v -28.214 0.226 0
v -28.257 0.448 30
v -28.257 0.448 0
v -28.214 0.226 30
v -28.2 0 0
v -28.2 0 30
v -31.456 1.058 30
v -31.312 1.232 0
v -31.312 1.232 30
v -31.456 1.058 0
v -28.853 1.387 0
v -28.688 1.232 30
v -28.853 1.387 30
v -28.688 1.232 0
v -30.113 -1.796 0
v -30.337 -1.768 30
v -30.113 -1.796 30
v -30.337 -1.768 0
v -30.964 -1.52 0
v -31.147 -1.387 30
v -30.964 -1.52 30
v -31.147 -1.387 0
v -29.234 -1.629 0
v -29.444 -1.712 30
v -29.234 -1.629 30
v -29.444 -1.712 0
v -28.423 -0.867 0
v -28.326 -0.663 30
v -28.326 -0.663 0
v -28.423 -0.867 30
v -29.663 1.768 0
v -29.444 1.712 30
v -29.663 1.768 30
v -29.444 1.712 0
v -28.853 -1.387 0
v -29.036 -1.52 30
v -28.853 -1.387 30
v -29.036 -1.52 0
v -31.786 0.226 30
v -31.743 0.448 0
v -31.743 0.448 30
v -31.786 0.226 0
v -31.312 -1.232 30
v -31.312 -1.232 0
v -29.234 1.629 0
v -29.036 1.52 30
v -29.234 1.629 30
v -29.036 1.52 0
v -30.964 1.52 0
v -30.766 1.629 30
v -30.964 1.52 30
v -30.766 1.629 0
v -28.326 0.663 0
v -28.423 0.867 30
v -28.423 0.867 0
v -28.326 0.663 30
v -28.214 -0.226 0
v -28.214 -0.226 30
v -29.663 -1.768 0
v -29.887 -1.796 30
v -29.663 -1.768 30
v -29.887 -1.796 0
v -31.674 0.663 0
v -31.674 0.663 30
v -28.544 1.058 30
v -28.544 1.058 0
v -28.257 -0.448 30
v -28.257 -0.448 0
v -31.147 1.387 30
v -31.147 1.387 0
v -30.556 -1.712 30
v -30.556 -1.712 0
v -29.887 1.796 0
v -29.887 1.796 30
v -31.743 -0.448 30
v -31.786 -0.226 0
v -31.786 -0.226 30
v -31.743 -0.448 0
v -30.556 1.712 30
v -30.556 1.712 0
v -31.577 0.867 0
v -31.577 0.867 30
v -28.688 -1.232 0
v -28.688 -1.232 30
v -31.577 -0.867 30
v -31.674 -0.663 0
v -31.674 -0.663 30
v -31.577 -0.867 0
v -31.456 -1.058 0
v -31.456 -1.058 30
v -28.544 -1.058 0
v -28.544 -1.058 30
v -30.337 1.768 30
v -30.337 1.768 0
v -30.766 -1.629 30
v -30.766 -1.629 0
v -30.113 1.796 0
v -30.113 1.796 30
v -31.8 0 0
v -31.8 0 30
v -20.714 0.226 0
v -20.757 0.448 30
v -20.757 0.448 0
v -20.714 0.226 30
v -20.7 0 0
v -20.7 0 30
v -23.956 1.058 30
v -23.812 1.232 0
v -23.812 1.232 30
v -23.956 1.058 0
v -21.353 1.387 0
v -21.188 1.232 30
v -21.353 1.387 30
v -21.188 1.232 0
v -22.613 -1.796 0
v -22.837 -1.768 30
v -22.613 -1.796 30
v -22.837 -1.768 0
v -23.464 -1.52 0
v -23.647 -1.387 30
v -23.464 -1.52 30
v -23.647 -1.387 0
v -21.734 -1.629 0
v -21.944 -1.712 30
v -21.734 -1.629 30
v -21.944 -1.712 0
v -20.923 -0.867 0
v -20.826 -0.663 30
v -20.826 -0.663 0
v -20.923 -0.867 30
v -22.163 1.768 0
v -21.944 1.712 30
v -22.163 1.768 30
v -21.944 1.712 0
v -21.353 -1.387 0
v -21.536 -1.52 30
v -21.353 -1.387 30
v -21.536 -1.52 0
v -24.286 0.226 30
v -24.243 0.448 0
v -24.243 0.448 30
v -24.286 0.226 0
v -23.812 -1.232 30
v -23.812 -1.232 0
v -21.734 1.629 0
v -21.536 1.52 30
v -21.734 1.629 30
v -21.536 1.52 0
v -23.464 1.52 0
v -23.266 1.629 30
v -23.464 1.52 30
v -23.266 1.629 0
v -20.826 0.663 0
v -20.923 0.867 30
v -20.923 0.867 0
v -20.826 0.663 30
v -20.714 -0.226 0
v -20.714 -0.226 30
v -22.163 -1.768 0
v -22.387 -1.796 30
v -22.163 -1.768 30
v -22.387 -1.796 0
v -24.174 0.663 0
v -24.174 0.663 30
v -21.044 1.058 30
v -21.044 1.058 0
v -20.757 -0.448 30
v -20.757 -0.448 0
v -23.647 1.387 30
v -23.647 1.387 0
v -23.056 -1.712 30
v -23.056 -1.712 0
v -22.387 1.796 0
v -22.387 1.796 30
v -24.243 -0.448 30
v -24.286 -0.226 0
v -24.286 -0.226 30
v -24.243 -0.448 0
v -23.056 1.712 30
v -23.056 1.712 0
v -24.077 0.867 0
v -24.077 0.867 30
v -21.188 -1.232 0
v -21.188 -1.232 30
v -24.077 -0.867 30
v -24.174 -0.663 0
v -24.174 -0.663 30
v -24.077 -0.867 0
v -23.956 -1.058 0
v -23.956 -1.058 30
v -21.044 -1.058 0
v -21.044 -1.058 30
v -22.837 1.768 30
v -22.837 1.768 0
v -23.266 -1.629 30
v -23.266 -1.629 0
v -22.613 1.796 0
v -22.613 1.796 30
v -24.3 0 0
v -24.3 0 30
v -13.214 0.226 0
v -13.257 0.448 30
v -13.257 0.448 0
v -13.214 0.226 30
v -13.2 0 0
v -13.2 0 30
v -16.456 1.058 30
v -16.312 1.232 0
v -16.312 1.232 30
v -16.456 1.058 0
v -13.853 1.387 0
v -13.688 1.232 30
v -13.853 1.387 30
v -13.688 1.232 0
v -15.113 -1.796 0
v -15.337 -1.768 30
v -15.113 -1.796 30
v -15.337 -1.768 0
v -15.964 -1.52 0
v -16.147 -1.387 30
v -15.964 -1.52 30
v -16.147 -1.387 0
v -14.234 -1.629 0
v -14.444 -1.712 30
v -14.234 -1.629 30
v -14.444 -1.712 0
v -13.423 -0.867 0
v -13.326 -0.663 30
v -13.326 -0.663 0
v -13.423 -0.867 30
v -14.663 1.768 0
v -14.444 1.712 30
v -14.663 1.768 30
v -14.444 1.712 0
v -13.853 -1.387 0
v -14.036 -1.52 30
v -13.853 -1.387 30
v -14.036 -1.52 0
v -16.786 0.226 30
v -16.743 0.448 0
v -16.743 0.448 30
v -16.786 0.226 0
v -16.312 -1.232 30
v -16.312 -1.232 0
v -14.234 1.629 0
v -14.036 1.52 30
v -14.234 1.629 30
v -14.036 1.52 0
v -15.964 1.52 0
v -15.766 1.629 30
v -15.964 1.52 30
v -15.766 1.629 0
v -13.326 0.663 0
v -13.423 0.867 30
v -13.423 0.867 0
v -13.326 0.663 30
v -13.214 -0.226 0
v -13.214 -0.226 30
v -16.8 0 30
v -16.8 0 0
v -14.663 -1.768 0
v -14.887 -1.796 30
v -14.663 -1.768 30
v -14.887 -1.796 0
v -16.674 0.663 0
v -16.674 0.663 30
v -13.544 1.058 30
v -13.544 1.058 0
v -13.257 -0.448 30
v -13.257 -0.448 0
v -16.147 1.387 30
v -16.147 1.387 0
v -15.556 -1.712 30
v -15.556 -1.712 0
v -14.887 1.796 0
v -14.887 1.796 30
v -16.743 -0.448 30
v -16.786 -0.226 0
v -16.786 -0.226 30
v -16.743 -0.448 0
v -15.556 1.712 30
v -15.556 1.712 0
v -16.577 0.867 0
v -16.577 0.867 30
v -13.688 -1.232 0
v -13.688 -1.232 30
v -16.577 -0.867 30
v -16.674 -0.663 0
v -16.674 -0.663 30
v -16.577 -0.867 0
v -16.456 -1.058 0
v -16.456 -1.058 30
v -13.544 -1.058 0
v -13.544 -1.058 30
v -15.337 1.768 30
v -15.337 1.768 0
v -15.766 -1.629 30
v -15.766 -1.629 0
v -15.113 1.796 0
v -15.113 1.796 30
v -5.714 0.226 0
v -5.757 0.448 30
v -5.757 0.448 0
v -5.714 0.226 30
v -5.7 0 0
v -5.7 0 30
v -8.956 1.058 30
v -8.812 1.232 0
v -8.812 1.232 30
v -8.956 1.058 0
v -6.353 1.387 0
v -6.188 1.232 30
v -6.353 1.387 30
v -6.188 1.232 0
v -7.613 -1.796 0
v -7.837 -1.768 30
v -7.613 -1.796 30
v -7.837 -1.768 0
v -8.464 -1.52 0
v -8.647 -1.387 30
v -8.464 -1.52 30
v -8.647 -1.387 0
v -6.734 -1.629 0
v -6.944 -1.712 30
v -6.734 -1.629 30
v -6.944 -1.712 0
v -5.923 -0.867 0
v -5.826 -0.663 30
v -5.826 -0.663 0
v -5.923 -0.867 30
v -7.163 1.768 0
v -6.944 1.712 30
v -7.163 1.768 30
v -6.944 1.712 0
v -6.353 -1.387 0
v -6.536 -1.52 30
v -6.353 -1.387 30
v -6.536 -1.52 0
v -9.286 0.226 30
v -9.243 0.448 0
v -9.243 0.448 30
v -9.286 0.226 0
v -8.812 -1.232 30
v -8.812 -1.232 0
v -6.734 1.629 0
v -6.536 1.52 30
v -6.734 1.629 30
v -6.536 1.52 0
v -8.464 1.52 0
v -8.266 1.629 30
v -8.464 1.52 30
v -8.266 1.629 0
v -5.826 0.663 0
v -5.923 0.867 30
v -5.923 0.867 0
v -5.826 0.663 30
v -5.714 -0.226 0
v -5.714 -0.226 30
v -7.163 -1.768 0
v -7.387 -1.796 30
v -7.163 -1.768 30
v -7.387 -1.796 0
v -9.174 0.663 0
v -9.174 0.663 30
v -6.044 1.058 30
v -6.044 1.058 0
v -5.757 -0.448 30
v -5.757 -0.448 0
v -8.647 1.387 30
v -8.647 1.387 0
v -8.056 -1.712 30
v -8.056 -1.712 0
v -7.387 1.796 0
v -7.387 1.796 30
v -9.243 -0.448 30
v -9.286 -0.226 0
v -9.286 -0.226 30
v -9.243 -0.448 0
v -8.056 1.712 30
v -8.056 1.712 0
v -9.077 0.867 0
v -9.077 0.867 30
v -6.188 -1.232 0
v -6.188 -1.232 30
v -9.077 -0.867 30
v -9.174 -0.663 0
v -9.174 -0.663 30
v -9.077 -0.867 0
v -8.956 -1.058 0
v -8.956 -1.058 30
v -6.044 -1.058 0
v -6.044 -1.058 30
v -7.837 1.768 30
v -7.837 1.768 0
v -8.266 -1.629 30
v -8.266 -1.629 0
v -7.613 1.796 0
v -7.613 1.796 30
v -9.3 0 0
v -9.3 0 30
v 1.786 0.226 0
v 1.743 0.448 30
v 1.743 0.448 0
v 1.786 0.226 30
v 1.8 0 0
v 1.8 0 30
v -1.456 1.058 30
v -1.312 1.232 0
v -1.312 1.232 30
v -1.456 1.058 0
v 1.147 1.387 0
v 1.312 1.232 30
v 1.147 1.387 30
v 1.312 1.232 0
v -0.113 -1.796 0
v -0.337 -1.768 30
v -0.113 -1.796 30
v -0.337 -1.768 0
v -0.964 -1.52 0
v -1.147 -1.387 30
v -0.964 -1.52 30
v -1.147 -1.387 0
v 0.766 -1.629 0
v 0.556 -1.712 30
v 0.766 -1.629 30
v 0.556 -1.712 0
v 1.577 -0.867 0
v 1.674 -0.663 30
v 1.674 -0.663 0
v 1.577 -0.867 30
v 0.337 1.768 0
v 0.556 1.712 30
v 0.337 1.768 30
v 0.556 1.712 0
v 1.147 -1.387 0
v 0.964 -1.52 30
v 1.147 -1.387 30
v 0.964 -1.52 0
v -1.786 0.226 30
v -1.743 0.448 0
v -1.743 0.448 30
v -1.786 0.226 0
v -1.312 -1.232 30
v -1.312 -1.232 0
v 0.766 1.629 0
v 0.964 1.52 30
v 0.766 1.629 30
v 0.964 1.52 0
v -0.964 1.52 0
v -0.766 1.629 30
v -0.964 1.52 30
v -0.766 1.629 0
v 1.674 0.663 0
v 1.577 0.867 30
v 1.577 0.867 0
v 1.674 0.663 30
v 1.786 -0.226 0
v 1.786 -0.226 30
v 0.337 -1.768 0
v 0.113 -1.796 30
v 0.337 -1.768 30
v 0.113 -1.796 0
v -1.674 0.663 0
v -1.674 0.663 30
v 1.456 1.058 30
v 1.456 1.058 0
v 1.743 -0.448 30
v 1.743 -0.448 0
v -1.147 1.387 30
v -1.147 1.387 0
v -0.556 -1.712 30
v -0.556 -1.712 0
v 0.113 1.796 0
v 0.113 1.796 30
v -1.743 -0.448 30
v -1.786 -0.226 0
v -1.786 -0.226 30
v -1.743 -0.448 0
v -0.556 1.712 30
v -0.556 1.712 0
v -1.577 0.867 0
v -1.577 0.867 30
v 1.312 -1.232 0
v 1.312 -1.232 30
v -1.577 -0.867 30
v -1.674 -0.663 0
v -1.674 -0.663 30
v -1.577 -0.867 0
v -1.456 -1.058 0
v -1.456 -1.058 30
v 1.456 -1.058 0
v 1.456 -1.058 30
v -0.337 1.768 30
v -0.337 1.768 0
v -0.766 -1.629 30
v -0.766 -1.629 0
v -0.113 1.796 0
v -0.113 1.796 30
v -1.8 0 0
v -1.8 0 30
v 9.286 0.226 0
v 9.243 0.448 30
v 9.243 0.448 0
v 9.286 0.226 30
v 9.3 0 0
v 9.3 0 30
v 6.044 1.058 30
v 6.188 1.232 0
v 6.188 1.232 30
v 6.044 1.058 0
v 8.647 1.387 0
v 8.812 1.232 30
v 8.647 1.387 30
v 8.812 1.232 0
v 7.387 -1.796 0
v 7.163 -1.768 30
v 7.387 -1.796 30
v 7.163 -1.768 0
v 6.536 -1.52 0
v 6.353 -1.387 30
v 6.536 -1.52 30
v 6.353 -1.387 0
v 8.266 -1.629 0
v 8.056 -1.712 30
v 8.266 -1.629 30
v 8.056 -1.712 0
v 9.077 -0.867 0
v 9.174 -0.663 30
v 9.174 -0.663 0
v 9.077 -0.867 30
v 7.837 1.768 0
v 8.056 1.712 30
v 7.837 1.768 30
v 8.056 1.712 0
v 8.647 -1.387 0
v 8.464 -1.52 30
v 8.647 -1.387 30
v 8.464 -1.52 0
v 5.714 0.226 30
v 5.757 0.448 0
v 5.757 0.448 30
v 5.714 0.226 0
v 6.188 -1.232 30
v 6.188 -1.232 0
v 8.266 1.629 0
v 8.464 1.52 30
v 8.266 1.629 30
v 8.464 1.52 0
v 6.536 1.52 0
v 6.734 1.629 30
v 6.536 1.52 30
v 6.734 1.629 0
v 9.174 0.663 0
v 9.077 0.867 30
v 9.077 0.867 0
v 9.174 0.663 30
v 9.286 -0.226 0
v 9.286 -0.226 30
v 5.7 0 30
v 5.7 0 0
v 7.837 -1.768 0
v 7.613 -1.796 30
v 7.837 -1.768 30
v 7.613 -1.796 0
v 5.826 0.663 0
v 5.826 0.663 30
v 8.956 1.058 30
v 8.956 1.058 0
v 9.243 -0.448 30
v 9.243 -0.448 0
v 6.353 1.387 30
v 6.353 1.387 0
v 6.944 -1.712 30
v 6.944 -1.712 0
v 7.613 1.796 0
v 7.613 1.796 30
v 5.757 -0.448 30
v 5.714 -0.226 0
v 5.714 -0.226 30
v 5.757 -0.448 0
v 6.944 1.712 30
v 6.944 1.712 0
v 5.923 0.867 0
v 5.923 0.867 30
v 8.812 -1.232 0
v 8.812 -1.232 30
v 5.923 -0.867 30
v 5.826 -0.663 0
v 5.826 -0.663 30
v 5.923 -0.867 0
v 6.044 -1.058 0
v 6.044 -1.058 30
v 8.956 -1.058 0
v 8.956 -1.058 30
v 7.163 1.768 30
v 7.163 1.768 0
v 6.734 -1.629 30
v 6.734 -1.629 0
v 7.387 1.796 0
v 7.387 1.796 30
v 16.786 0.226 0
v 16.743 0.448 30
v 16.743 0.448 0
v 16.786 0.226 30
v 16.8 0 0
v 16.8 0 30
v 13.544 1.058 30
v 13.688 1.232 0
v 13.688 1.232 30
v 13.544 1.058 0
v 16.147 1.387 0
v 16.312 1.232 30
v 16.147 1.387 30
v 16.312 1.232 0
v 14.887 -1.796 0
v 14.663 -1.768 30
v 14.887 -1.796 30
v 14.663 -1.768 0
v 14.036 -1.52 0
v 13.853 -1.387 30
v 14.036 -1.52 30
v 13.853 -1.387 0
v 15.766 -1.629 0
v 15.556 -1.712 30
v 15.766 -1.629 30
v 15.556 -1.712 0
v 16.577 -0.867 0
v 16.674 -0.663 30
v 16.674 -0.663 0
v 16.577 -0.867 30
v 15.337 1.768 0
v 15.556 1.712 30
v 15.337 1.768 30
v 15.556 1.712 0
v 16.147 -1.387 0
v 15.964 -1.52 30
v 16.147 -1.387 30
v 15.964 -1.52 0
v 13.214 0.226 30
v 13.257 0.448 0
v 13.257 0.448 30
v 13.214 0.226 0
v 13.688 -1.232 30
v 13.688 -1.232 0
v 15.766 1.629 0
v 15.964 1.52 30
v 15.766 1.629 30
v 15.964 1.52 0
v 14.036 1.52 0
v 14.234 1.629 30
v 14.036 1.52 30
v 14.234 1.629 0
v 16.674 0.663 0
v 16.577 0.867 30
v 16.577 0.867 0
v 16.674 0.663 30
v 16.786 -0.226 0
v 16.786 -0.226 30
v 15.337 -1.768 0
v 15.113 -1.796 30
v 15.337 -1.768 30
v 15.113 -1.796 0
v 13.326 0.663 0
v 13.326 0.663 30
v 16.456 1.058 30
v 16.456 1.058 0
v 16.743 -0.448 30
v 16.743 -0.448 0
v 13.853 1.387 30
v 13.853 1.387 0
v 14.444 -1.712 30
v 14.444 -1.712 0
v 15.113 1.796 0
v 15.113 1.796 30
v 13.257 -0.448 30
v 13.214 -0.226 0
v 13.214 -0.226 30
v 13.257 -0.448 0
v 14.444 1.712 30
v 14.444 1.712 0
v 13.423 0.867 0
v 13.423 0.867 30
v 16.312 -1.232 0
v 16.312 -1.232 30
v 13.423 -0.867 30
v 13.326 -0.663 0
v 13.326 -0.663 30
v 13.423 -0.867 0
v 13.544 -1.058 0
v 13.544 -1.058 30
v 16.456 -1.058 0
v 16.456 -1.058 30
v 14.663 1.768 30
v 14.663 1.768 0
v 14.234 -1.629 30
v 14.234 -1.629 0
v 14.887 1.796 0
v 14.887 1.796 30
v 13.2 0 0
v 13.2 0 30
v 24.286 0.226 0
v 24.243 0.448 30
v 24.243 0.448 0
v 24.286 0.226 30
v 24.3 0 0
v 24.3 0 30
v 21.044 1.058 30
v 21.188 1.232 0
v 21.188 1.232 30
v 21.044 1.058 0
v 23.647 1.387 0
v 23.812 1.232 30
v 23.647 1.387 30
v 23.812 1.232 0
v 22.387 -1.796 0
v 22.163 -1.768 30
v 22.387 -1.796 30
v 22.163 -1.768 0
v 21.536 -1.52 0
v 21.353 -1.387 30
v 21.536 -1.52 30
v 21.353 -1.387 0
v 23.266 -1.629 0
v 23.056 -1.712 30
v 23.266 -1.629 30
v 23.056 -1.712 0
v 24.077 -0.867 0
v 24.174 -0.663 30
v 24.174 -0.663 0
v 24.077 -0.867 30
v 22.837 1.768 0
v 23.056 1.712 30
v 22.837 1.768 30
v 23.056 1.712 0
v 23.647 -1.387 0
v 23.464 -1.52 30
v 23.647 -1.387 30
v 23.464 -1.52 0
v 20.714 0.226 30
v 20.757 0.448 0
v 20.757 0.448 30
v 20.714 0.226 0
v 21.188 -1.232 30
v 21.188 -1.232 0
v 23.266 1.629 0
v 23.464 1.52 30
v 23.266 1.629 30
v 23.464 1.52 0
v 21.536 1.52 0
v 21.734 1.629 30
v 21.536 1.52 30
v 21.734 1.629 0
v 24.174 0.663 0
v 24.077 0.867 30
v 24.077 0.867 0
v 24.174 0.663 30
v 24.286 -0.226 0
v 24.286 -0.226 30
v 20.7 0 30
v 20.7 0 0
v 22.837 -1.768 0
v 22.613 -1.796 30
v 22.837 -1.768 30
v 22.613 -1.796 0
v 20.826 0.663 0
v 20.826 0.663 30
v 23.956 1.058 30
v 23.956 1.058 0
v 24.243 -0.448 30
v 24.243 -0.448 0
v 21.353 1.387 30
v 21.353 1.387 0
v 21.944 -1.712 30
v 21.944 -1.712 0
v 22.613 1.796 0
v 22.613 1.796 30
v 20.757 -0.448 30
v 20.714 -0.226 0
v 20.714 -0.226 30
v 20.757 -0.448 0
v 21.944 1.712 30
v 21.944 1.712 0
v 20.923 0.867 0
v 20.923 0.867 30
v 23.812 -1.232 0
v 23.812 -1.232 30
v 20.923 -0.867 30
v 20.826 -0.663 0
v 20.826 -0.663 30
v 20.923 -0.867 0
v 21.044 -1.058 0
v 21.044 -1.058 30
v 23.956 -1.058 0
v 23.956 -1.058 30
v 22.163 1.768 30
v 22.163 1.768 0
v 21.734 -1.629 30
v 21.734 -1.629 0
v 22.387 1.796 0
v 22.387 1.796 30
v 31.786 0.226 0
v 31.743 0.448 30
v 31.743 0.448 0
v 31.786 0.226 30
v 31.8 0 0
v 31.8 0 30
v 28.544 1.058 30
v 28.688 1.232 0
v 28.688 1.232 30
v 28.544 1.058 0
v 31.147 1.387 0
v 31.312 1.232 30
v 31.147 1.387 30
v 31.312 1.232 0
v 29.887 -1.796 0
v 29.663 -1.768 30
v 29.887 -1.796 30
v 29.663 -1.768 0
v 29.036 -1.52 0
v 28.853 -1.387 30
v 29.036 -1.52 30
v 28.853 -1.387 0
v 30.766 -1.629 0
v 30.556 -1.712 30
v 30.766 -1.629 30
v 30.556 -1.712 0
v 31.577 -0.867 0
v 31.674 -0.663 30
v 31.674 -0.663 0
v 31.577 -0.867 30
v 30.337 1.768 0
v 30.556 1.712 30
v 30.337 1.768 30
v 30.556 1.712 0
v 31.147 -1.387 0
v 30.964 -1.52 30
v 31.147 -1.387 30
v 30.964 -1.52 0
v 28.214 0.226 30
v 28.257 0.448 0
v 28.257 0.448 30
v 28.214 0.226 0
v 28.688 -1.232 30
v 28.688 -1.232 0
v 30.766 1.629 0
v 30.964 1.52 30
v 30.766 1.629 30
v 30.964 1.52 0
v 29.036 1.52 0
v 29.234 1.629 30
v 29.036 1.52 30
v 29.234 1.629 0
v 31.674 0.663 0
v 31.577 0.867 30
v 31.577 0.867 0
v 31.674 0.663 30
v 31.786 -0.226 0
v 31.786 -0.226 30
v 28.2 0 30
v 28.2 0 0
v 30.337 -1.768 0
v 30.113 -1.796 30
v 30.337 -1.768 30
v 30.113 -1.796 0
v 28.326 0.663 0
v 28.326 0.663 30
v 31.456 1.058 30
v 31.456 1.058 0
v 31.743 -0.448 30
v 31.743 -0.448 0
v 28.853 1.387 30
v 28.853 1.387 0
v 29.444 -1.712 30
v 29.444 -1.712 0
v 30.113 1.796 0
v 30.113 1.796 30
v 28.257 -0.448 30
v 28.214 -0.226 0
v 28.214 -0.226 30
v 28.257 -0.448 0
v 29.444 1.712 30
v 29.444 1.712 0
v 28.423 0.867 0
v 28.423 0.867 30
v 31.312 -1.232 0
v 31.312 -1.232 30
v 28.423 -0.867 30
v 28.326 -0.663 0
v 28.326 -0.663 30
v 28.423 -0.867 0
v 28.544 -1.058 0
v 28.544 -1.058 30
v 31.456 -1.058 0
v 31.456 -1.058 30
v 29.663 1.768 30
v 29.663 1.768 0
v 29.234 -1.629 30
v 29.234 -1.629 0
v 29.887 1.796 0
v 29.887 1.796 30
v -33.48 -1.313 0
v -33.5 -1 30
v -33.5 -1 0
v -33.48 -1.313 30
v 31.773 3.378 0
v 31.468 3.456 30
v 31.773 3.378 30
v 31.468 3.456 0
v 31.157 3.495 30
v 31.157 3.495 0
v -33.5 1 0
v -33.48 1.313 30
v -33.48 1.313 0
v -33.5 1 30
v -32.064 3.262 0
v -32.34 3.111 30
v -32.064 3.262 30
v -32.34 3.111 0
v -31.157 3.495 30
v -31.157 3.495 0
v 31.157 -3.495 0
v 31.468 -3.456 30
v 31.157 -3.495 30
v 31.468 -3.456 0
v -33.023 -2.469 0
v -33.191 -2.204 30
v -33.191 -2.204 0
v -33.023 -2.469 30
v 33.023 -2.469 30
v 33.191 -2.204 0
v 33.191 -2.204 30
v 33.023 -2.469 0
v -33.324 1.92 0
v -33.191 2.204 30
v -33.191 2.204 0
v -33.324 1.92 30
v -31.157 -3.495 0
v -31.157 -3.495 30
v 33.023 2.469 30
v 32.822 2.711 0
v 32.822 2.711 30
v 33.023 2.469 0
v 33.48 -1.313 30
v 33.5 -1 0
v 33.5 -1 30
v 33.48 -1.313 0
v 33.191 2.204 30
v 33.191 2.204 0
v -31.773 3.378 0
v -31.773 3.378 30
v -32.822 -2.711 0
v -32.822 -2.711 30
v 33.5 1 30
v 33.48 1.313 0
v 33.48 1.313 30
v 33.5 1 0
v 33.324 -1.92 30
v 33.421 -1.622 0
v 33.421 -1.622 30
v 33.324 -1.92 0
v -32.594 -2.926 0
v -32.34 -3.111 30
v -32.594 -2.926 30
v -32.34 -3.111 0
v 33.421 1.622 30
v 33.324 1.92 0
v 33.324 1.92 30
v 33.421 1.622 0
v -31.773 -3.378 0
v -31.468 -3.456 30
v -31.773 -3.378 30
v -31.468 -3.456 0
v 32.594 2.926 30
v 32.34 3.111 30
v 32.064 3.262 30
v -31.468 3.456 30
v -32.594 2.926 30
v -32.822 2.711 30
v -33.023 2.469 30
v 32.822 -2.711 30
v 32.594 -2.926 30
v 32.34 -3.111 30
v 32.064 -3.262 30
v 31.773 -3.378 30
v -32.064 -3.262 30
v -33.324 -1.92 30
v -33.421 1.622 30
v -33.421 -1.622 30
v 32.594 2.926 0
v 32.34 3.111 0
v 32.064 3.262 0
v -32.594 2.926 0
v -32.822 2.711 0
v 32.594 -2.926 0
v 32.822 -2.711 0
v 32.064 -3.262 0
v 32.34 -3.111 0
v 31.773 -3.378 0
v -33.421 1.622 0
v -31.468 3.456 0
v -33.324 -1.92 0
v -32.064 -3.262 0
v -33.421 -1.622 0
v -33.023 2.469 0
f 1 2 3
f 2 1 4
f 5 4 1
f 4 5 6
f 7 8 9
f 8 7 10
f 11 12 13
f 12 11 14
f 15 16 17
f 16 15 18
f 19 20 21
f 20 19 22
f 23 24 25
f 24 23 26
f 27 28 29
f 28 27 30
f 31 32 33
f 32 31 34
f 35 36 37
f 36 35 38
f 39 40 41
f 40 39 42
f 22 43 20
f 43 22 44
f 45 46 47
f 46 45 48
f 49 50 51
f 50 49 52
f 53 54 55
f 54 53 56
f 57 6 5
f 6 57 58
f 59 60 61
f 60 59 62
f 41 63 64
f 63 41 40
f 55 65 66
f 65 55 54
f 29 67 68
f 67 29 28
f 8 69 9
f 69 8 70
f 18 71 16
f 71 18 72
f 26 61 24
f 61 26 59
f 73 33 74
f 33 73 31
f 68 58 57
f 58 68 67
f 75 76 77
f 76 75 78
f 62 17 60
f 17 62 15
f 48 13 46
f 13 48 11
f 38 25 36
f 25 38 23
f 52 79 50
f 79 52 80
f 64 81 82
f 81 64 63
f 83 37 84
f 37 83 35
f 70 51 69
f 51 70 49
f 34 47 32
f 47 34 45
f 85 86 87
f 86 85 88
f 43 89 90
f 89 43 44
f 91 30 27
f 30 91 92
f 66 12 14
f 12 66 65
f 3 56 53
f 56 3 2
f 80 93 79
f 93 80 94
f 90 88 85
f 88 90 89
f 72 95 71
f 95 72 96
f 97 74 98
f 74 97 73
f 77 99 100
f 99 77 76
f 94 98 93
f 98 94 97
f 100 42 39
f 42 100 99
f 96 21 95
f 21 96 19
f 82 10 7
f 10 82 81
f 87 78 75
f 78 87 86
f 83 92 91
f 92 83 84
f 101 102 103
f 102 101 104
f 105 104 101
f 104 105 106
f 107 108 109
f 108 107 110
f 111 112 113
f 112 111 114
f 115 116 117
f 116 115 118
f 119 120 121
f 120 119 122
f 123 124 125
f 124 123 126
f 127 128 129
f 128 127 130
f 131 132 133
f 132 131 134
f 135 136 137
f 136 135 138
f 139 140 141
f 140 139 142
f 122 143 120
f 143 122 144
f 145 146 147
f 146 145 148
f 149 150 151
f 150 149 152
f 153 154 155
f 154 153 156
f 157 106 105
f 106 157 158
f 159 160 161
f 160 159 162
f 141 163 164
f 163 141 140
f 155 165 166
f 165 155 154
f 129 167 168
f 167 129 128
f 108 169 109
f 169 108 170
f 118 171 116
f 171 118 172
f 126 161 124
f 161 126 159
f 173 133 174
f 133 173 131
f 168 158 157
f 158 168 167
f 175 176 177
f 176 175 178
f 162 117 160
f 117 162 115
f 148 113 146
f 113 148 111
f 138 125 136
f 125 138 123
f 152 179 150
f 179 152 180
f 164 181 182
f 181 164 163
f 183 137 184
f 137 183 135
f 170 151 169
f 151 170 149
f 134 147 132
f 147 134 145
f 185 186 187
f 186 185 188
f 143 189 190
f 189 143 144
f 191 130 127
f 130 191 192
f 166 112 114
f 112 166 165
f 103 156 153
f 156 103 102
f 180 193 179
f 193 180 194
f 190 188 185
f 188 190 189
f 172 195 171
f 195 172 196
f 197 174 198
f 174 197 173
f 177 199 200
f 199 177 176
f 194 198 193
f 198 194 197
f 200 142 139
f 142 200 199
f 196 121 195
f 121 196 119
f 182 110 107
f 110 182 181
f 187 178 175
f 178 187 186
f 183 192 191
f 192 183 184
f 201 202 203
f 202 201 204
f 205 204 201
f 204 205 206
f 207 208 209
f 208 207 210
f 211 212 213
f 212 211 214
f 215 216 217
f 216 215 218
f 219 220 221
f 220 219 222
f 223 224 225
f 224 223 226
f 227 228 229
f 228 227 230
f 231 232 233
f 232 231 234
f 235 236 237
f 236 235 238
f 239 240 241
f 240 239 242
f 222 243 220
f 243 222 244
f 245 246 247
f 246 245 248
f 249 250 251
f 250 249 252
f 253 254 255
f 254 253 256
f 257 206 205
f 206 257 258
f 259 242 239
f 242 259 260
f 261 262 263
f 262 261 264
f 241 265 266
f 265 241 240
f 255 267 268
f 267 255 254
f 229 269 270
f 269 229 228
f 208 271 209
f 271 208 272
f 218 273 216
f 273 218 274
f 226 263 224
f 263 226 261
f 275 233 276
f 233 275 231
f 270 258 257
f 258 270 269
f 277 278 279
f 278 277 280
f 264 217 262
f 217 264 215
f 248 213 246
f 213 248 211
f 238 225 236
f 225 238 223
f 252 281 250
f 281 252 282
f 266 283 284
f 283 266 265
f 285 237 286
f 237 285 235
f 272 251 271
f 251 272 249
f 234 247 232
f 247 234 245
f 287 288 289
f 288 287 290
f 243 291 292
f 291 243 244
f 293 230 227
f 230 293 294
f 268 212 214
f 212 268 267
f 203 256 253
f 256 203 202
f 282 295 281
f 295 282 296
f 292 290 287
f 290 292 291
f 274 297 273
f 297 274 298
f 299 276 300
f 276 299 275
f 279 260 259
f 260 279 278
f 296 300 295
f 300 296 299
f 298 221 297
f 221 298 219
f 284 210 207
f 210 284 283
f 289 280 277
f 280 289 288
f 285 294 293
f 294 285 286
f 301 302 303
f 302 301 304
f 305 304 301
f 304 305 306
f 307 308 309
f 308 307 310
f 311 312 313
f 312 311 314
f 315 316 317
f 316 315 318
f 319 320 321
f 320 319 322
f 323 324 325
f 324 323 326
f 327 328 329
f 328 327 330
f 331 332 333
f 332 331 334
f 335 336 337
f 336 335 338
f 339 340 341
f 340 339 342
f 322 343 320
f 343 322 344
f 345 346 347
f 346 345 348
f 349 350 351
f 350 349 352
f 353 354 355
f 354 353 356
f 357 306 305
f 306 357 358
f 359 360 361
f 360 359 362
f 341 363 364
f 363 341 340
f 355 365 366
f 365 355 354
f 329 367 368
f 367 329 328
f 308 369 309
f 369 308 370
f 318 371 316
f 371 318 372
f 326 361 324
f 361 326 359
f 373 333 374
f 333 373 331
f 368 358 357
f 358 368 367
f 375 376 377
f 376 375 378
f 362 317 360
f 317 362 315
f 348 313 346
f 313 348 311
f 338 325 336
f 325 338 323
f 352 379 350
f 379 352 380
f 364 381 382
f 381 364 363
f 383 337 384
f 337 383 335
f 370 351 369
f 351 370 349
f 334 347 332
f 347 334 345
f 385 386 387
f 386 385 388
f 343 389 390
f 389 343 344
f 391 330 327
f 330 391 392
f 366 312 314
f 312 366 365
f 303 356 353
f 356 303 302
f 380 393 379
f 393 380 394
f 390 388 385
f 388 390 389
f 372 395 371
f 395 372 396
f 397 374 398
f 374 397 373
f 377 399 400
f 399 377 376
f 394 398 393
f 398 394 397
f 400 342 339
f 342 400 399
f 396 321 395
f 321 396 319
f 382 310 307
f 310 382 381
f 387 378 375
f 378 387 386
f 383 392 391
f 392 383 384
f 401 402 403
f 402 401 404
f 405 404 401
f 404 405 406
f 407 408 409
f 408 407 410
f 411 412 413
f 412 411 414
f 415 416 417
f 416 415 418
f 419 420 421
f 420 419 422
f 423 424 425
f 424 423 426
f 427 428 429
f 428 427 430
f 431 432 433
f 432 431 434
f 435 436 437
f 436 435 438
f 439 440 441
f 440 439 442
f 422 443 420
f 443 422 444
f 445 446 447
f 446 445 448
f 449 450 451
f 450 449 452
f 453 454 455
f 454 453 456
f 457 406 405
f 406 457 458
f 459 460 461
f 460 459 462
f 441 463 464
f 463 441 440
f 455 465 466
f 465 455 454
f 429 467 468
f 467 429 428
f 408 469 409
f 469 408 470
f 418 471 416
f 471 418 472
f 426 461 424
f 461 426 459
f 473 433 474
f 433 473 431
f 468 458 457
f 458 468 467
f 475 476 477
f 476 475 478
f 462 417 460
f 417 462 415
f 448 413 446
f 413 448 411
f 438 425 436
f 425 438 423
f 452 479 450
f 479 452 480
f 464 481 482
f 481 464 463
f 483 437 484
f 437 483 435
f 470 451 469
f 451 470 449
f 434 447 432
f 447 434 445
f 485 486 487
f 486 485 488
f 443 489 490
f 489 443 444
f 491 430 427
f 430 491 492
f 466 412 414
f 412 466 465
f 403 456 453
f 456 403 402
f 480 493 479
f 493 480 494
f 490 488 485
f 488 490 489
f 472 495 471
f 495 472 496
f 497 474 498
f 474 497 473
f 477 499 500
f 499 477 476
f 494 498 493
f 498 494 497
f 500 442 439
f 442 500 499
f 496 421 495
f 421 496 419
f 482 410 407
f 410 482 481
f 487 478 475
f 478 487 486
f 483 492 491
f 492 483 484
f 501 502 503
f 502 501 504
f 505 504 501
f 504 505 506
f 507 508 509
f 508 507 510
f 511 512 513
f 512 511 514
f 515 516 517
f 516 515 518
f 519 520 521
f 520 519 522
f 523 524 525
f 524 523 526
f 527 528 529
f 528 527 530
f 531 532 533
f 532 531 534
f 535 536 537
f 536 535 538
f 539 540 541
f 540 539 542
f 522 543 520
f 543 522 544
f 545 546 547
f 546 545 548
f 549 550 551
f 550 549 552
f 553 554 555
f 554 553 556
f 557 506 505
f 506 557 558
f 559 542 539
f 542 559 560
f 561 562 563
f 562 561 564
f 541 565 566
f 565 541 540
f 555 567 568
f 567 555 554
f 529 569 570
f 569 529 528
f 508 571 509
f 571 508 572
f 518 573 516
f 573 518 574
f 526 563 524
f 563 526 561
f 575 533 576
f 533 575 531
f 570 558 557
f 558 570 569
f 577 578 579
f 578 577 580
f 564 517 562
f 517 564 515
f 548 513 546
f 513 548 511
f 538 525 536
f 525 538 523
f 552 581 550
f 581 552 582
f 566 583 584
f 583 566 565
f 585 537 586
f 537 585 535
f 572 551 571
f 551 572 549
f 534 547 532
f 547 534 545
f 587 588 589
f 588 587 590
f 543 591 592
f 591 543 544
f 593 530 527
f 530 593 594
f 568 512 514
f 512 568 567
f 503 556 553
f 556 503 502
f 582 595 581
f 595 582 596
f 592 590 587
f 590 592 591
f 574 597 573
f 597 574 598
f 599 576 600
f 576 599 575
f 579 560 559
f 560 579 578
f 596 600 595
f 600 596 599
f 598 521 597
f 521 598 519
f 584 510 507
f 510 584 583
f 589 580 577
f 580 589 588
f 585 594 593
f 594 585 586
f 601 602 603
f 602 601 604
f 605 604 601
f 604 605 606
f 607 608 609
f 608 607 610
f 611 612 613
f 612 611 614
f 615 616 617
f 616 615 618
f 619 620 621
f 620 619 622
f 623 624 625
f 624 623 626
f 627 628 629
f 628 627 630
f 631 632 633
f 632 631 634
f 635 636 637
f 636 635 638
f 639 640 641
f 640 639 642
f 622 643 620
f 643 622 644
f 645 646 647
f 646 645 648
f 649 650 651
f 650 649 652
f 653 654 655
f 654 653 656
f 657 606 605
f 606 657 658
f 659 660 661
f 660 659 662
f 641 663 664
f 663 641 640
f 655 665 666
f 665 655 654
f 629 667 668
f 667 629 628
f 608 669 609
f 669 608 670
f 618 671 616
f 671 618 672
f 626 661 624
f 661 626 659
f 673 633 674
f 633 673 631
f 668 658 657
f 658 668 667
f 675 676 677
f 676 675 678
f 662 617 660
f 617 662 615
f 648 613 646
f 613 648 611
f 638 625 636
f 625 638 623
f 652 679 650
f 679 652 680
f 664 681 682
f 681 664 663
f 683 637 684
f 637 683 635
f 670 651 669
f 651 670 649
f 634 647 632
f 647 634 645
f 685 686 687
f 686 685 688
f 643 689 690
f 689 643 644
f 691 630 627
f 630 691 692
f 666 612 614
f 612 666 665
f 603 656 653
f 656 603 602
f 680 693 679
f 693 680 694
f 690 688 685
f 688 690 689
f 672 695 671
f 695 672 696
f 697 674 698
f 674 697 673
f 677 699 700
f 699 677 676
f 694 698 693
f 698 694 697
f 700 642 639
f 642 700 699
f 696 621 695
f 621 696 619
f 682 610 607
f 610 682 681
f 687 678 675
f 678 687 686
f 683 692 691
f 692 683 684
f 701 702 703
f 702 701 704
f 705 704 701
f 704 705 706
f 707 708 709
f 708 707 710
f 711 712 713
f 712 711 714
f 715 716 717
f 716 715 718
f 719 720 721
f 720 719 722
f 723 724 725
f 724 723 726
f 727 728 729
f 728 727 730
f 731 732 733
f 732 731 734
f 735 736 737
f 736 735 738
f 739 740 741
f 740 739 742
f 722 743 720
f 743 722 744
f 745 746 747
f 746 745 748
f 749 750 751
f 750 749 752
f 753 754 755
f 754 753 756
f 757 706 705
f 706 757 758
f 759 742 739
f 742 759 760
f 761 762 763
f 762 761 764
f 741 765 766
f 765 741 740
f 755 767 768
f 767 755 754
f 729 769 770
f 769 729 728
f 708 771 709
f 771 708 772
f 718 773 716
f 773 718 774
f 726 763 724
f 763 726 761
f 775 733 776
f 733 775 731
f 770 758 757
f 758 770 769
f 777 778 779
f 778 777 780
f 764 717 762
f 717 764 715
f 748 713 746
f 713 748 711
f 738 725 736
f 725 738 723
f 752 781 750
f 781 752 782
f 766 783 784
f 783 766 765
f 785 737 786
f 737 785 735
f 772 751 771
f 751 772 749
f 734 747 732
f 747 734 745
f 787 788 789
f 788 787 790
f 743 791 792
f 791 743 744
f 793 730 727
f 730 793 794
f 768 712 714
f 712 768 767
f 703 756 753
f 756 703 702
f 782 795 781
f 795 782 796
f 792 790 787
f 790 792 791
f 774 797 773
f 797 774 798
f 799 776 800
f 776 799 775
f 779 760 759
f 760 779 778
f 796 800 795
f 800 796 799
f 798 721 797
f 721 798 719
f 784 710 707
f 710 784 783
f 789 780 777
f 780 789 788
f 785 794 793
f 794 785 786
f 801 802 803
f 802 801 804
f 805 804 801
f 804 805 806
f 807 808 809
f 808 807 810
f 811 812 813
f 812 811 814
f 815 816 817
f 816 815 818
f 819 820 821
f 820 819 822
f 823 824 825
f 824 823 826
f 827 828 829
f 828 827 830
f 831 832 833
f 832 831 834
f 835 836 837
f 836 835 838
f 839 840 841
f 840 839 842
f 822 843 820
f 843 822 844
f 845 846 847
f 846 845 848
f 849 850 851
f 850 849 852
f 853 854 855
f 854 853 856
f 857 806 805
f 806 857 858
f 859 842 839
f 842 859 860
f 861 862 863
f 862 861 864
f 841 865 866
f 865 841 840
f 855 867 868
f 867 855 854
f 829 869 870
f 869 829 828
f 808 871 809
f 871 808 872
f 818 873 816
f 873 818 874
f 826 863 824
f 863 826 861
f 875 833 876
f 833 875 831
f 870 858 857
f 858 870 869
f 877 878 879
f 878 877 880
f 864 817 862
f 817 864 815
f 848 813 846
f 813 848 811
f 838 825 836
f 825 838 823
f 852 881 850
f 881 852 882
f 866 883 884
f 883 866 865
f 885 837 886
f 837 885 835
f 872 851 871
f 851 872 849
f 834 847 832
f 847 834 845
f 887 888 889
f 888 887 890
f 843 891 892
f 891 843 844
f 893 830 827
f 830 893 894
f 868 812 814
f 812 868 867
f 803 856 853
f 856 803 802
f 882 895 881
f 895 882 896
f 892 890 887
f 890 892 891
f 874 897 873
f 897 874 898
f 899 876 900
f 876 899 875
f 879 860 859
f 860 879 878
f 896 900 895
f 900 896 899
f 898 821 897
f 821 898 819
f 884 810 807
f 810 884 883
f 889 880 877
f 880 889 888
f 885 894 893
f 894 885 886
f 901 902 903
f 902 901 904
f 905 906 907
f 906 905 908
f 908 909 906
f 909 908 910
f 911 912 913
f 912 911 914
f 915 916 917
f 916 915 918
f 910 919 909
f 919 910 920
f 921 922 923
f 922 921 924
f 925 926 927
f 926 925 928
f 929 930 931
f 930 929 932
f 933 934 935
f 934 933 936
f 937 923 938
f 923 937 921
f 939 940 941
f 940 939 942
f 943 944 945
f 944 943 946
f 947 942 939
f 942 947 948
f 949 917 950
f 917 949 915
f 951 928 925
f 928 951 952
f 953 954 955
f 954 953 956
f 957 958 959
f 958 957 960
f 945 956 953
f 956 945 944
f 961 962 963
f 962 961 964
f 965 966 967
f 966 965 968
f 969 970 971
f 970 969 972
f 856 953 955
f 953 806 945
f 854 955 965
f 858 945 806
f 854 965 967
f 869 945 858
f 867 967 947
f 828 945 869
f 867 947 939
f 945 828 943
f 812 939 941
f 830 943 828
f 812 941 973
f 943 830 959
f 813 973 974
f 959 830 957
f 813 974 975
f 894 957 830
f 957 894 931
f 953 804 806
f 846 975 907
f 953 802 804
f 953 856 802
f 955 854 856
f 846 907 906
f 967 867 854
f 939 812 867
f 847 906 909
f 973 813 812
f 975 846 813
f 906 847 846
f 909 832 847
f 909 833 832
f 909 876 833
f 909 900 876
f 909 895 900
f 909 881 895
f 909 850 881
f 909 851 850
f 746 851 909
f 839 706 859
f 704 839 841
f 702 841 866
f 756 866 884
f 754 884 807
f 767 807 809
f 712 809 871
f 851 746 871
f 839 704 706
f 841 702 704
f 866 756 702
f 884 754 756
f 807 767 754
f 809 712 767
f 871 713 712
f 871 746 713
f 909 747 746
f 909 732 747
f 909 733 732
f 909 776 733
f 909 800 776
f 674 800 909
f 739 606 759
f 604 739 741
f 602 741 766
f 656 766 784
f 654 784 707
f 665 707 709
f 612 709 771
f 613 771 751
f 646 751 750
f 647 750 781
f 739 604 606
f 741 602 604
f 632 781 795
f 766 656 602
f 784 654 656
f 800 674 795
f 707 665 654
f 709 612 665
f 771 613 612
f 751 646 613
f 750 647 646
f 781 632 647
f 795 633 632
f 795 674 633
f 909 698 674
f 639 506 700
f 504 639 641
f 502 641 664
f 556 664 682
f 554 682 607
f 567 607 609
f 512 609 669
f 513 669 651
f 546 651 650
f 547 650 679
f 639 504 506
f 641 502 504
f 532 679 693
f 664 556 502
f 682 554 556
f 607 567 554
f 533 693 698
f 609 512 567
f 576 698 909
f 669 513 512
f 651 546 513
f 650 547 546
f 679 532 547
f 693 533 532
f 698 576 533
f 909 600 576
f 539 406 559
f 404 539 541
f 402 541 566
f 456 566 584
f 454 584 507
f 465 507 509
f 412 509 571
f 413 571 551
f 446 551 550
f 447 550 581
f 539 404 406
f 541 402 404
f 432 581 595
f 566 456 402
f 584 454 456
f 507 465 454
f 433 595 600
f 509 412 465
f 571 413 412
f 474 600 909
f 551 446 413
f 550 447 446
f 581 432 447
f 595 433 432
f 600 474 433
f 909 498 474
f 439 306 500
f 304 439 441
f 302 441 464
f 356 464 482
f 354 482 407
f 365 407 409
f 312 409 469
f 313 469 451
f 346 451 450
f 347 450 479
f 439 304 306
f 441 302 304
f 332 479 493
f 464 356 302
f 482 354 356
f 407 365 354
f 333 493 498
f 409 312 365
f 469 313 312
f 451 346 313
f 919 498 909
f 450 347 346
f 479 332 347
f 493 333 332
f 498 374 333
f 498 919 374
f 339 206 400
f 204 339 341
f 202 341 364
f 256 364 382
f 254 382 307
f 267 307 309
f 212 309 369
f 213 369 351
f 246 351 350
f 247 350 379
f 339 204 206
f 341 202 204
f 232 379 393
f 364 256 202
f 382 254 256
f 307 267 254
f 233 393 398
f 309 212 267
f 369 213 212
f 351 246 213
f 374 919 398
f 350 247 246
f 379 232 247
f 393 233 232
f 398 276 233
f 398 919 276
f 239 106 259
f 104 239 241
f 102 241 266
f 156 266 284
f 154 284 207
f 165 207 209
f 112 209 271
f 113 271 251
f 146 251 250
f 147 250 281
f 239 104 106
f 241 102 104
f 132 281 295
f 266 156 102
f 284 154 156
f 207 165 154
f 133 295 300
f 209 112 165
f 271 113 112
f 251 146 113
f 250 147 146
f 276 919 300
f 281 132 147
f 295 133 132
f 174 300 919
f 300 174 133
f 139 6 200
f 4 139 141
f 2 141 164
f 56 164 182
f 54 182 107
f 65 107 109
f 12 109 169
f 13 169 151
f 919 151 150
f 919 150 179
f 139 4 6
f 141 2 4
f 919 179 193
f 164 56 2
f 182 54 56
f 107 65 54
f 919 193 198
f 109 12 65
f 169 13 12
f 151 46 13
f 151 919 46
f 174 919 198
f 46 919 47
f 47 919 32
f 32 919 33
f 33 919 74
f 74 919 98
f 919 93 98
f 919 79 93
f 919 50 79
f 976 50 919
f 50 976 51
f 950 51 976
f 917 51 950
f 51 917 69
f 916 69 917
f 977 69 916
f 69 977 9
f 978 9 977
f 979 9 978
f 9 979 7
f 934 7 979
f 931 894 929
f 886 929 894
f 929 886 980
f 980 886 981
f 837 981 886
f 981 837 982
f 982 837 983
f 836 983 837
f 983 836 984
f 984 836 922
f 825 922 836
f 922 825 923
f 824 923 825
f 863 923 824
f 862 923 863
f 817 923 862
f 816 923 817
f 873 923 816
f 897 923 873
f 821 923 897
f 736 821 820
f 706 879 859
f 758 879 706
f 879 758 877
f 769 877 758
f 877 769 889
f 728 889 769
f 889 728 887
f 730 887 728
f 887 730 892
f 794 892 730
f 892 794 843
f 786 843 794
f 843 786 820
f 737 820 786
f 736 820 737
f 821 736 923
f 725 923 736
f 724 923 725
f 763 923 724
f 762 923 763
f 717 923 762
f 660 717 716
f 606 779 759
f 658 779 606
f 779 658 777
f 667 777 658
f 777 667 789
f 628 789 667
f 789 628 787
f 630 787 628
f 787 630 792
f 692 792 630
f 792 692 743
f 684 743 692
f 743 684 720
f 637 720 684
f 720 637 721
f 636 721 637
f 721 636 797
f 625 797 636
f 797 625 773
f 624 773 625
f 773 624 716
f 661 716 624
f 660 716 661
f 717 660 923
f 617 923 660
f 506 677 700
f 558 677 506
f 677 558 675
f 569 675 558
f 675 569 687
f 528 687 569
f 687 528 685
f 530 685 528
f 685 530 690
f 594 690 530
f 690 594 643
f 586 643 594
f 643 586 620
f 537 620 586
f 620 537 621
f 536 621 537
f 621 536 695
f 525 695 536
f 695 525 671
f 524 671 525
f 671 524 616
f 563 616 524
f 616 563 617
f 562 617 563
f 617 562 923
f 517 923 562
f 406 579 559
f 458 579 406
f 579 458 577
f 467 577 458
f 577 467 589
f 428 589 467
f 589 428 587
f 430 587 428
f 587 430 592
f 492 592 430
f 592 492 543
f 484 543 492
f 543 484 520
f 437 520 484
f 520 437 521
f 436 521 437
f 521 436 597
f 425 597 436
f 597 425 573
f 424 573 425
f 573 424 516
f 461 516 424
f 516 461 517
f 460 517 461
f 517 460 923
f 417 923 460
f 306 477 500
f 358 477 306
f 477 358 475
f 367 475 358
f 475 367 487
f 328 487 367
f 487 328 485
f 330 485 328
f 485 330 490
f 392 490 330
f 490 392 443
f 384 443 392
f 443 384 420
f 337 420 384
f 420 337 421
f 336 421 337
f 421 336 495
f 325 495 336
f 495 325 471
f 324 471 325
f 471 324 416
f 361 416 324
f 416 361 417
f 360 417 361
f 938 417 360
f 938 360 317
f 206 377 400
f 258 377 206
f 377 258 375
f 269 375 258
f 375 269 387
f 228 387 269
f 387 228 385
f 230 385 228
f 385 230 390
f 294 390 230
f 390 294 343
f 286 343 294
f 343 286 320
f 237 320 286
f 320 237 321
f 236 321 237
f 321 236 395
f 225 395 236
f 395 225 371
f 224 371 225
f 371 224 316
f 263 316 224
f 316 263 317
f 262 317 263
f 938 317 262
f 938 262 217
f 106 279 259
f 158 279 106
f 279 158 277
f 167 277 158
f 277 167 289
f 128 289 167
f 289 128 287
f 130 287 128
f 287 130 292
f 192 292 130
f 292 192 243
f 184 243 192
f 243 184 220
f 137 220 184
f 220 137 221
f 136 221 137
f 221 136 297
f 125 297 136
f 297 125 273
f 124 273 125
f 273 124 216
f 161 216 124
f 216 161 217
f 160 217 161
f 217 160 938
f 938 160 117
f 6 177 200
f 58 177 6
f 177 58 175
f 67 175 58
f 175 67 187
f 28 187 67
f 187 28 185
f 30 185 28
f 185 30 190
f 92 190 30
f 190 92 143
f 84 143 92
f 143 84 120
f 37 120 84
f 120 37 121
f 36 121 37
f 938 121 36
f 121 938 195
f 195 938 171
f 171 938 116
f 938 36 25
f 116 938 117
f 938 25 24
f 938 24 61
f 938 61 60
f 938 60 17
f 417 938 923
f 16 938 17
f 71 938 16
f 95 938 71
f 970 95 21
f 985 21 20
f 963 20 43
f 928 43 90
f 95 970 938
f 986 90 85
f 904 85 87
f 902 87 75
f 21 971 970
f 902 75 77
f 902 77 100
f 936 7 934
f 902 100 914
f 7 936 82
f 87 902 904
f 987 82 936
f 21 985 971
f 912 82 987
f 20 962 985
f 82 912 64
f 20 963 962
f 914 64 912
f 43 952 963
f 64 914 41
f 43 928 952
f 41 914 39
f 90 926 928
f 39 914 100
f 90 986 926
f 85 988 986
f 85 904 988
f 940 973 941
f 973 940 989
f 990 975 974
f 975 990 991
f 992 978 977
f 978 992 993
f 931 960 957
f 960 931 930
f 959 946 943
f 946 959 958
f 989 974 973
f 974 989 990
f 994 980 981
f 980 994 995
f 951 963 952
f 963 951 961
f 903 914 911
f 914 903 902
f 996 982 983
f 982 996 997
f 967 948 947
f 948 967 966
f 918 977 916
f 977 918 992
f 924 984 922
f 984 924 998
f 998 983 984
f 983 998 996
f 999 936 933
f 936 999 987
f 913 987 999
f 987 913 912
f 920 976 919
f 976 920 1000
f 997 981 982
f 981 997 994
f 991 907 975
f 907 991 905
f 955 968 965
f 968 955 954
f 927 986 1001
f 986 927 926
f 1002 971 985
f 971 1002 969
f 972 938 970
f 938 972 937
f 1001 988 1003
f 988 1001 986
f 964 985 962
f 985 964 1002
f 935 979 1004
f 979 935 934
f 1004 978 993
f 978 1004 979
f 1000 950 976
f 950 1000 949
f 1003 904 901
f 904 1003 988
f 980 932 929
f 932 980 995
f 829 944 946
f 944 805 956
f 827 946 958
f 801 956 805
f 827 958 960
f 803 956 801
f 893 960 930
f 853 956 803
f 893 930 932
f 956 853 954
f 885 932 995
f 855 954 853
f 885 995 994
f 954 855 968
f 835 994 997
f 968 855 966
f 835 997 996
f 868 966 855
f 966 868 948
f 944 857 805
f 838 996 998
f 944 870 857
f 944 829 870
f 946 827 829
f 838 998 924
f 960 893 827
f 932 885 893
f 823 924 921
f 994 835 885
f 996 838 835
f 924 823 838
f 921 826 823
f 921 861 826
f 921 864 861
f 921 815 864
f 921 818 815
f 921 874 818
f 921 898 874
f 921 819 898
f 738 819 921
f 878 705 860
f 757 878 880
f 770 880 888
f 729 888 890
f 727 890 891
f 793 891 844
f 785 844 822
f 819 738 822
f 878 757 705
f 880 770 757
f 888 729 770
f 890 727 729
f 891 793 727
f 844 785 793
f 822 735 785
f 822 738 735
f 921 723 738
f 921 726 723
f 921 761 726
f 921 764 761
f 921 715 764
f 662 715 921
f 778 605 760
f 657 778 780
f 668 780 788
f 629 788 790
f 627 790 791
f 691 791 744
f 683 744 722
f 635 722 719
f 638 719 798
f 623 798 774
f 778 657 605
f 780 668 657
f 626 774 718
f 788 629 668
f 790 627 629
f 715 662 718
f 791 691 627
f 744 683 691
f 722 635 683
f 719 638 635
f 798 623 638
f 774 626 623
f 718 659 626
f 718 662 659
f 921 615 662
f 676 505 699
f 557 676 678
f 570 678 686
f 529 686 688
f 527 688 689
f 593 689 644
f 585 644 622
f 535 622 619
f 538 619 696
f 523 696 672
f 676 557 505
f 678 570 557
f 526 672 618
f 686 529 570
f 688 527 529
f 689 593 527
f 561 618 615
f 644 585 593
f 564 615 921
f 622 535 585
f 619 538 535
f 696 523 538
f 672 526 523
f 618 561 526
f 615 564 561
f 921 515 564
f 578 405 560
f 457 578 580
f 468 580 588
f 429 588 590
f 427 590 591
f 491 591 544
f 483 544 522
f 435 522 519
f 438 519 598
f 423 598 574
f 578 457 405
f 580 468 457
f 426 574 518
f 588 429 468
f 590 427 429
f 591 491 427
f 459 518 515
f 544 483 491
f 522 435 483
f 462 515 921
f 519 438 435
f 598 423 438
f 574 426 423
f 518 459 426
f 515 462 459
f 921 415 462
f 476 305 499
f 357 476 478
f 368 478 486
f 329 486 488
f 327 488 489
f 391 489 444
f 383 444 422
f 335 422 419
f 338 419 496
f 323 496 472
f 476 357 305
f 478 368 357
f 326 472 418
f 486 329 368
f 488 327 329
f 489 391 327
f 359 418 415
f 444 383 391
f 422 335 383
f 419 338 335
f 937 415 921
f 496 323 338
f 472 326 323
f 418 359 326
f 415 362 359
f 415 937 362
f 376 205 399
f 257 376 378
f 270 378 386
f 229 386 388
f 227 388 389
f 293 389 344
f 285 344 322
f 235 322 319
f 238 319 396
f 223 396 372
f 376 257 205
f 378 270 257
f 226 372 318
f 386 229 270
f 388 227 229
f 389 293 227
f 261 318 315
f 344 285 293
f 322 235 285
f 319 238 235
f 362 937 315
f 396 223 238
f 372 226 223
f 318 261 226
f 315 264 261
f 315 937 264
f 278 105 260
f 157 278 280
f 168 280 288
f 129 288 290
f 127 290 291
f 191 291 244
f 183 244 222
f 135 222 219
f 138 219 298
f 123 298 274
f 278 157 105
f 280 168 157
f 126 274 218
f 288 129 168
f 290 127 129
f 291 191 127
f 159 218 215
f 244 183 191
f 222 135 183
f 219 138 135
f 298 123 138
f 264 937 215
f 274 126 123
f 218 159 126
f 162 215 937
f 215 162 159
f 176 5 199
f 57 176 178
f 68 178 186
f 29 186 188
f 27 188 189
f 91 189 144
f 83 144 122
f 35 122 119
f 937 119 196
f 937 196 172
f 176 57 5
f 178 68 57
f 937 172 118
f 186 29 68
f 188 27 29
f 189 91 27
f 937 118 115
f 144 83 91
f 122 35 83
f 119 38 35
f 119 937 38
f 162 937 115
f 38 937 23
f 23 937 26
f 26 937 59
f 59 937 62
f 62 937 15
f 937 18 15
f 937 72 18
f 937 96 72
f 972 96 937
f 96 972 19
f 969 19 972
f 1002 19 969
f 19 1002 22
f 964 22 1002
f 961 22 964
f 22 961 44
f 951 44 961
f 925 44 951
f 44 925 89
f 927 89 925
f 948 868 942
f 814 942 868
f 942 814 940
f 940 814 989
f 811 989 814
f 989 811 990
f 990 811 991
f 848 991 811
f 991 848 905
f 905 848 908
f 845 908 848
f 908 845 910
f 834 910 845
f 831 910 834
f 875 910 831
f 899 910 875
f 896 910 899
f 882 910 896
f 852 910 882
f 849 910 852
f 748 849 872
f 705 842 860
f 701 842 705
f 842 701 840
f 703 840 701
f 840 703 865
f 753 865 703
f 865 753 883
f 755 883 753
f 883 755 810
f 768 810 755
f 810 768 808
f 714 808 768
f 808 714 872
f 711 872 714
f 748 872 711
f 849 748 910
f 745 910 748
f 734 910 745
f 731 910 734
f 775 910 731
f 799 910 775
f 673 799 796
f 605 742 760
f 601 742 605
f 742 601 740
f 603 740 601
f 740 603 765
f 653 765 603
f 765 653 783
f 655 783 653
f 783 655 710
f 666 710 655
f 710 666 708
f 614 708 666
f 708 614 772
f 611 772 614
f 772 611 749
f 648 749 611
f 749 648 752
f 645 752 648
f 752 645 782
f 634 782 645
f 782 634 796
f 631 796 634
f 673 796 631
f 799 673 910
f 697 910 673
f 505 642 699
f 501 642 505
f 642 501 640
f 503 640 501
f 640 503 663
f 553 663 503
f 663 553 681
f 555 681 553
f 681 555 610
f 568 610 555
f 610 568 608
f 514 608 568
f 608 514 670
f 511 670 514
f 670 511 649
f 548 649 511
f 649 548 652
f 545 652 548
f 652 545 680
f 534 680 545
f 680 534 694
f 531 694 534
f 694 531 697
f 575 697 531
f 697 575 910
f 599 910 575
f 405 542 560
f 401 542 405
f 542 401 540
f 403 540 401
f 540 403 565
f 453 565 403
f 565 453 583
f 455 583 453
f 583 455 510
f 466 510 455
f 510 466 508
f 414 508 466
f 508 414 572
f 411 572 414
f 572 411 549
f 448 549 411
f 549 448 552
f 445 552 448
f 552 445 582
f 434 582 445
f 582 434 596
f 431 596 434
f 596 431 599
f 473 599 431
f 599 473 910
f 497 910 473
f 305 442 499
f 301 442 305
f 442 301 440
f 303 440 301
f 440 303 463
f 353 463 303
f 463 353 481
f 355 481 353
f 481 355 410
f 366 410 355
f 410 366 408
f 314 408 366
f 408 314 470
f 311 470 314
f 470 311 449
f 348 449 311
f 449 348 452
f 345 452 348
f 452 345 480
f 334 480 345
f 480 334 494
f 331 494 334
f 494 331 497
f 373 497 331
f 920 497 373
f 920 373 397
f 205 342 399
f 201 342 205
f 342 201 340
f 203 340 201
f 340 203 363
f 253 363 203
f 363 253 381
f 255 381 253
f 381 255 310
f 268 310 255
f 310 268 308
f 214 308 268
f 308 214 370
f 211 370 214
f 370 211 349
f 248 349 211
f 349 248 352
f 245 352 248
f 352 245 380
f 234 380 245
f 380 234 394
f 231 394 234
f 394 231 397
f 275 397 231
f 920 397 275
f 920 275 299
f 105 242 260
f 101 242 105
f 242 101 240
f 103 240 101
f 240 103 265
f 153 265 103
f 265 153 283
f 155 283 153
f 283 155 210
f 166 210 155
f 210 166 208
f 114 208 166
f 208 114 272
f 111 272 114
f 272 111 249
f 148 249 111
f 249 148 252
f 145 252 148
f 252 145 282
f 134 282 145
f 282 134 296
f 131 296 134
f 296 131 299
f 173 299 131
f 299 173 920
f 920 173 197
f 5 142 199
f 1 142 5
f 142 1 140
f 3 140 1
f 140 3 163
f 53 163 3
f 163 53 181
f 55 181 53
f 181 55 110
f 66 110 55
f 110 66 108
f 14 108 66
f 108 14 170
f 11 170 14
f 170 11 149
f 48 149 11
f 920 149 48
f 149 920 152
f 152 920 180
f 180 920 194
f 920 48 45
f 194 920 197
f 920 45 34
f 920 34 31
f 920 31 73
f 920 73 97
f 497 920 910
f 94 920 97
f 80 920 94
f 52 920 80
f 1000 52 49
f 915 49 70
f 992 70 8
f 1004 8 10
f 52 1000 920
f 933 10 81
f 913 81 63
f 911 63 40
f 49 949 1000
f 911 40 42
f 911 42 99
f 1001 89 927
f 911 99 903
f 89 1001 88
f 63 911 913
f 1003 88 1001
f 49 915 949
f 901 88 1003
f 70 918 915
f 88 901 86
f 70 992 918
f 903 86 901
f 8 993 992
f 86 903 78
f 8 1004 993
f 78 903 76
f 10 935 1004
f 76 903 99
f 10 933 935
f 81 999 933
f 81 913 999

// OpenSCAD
$fn = 50;


difference() {
	union() {
		translate(v = [0, 0, 0]) {
			rotate(a = [0, 0, 0]) {
				hull() {
					translate(v = [-31.0000000000, 1.0000000000, 0]) {
						rotate(a = [0, 0, 0]) {
							translate(v = [0, 0, 0]) {
								rotate(a = [0, 0, 0]) {
									cylinder(h = 30, r = 2.5000000000);
								}
							}
						}
					}
					translate(v = [31.0000000000, 1.0000000000, 0]) {
						rotate(a = [0, 0, 0]) {
							translate(v = [0, 0, 0]) {
								rotate(a = [0, 0, 0]) {
									cylinder(h = 30, r = 2.5000000000);
								}
							}
						}
					}
					translate(v = [-31.0000000000, -1.0000000000, 0]) {
						rotate(a = [0, 0, 0]) {
							translate(v = [0, 0, 0]) {
								rotate(a = [0, 0, 0]) {
									cylinder(h = 30, r = 2.5000000000);
								}
							}
						}
					}
					translate(v = [31.0000000000, -1.0000000000, 0]) {
						rotate(a = [0, 0, 0]) {
							translate(v = [0, 0, 0]) {
								rotate(a = [0, 0, 0]) {
									cylinder(h = 30, r = 2.5000000000);
								}
							}
						}
					}
				}
			}
		}
	}
	union() {
		translate(v = [-30.0000000000, 0.0000000000, 0]) {
			rotate(a = [0, 0, 0]) {
				translate(v = [0, 0, -50]) {
					rotate(a = [0, 0, 0]) {
						cylinder(h = 100, r = 1.8000000000);
					}
				}
			}
		}
		translate(v = [-22.5000000000, 0.0000000000, 0]) {
			rotate(a = [0, 0, 0]) {
				translate(v = [0, 0, -50]) {
					rotate(a = [0, 0, 0]) {
						cylinder(h = 100, r = 1.8000000000);
					}
				}
			}
		}
		translate(v = [-15.0000000000, 0.0000000000, 0]) {
			rotate(a = [0, 0, 0]) {
				translate(v = [0, 0, -50]) {
					rotate(a = [0, 0, 0]) {
						cylinder(h = 100, r = 1.8000000000);
					}
				}
			}
		}
		translate(v = [-7.5000000000, 0.0000000000, 0]) {
			rotate(a = [0, 0, 0]) {
				translate(v = [0, 0, -50]) {
					rotate(a = [0, 0, 0]) {
						cylinder(h = 100, r = 1.8000000000);
					}
				}
			}
		}
		translate(v = [0.0000000000, 0.0000000000, 0]) {
			rotate(a = [0, 0, 0]) {
				translate(v = [0, 0, -50]) {
					rotate(a = [0, 0, 0]) {
						cylinder(h = 100, r = 1.8000000000);
					}
				}
			}
		}
		translate(v = [7.5000000000, 0.0000000000, 0]) {
			rotate(a = [0, 0, 0]) {
				translate(v = [0, 0, -50]) {
					rotate(a = [0, 0, 0]) {
						cylinder(h = 100, r = 1.8000000000);
					}
				}
			}
		}
		translate(v = [15.0000000000, 0.0000000000, 0]) {
			rotate(a = [0, 0, 0]) {
				translate(v = [0, 0, -50]) {
					rotate(a = [0, 0, 0]) {
						cylinder(h = 100, r = 1.8000000000);
					}
				}
			}
		}
		translate(v = [22.5000000000, 0.0000000000, 0]) {
			rotate(a = [0, 0, 0]) {
				translate(v = [0, 0, -50]) {
					rotate(a = [0, 0, 0]) {
						cylinder(h = 100, r = 1.8000000000);
					}
				}
			}
		}
		translate(v = [30.0000000000, 0.0000000000, 0]) {
			rotate(a = [0, 0, 0]) {
				translate(v = [0, 0, -50]) {
					rotate(a = [0, 0, 0]) {
						cylinder(h = 100, r = 1.8000000000);
					}
				}
			}
		}
	}
}
